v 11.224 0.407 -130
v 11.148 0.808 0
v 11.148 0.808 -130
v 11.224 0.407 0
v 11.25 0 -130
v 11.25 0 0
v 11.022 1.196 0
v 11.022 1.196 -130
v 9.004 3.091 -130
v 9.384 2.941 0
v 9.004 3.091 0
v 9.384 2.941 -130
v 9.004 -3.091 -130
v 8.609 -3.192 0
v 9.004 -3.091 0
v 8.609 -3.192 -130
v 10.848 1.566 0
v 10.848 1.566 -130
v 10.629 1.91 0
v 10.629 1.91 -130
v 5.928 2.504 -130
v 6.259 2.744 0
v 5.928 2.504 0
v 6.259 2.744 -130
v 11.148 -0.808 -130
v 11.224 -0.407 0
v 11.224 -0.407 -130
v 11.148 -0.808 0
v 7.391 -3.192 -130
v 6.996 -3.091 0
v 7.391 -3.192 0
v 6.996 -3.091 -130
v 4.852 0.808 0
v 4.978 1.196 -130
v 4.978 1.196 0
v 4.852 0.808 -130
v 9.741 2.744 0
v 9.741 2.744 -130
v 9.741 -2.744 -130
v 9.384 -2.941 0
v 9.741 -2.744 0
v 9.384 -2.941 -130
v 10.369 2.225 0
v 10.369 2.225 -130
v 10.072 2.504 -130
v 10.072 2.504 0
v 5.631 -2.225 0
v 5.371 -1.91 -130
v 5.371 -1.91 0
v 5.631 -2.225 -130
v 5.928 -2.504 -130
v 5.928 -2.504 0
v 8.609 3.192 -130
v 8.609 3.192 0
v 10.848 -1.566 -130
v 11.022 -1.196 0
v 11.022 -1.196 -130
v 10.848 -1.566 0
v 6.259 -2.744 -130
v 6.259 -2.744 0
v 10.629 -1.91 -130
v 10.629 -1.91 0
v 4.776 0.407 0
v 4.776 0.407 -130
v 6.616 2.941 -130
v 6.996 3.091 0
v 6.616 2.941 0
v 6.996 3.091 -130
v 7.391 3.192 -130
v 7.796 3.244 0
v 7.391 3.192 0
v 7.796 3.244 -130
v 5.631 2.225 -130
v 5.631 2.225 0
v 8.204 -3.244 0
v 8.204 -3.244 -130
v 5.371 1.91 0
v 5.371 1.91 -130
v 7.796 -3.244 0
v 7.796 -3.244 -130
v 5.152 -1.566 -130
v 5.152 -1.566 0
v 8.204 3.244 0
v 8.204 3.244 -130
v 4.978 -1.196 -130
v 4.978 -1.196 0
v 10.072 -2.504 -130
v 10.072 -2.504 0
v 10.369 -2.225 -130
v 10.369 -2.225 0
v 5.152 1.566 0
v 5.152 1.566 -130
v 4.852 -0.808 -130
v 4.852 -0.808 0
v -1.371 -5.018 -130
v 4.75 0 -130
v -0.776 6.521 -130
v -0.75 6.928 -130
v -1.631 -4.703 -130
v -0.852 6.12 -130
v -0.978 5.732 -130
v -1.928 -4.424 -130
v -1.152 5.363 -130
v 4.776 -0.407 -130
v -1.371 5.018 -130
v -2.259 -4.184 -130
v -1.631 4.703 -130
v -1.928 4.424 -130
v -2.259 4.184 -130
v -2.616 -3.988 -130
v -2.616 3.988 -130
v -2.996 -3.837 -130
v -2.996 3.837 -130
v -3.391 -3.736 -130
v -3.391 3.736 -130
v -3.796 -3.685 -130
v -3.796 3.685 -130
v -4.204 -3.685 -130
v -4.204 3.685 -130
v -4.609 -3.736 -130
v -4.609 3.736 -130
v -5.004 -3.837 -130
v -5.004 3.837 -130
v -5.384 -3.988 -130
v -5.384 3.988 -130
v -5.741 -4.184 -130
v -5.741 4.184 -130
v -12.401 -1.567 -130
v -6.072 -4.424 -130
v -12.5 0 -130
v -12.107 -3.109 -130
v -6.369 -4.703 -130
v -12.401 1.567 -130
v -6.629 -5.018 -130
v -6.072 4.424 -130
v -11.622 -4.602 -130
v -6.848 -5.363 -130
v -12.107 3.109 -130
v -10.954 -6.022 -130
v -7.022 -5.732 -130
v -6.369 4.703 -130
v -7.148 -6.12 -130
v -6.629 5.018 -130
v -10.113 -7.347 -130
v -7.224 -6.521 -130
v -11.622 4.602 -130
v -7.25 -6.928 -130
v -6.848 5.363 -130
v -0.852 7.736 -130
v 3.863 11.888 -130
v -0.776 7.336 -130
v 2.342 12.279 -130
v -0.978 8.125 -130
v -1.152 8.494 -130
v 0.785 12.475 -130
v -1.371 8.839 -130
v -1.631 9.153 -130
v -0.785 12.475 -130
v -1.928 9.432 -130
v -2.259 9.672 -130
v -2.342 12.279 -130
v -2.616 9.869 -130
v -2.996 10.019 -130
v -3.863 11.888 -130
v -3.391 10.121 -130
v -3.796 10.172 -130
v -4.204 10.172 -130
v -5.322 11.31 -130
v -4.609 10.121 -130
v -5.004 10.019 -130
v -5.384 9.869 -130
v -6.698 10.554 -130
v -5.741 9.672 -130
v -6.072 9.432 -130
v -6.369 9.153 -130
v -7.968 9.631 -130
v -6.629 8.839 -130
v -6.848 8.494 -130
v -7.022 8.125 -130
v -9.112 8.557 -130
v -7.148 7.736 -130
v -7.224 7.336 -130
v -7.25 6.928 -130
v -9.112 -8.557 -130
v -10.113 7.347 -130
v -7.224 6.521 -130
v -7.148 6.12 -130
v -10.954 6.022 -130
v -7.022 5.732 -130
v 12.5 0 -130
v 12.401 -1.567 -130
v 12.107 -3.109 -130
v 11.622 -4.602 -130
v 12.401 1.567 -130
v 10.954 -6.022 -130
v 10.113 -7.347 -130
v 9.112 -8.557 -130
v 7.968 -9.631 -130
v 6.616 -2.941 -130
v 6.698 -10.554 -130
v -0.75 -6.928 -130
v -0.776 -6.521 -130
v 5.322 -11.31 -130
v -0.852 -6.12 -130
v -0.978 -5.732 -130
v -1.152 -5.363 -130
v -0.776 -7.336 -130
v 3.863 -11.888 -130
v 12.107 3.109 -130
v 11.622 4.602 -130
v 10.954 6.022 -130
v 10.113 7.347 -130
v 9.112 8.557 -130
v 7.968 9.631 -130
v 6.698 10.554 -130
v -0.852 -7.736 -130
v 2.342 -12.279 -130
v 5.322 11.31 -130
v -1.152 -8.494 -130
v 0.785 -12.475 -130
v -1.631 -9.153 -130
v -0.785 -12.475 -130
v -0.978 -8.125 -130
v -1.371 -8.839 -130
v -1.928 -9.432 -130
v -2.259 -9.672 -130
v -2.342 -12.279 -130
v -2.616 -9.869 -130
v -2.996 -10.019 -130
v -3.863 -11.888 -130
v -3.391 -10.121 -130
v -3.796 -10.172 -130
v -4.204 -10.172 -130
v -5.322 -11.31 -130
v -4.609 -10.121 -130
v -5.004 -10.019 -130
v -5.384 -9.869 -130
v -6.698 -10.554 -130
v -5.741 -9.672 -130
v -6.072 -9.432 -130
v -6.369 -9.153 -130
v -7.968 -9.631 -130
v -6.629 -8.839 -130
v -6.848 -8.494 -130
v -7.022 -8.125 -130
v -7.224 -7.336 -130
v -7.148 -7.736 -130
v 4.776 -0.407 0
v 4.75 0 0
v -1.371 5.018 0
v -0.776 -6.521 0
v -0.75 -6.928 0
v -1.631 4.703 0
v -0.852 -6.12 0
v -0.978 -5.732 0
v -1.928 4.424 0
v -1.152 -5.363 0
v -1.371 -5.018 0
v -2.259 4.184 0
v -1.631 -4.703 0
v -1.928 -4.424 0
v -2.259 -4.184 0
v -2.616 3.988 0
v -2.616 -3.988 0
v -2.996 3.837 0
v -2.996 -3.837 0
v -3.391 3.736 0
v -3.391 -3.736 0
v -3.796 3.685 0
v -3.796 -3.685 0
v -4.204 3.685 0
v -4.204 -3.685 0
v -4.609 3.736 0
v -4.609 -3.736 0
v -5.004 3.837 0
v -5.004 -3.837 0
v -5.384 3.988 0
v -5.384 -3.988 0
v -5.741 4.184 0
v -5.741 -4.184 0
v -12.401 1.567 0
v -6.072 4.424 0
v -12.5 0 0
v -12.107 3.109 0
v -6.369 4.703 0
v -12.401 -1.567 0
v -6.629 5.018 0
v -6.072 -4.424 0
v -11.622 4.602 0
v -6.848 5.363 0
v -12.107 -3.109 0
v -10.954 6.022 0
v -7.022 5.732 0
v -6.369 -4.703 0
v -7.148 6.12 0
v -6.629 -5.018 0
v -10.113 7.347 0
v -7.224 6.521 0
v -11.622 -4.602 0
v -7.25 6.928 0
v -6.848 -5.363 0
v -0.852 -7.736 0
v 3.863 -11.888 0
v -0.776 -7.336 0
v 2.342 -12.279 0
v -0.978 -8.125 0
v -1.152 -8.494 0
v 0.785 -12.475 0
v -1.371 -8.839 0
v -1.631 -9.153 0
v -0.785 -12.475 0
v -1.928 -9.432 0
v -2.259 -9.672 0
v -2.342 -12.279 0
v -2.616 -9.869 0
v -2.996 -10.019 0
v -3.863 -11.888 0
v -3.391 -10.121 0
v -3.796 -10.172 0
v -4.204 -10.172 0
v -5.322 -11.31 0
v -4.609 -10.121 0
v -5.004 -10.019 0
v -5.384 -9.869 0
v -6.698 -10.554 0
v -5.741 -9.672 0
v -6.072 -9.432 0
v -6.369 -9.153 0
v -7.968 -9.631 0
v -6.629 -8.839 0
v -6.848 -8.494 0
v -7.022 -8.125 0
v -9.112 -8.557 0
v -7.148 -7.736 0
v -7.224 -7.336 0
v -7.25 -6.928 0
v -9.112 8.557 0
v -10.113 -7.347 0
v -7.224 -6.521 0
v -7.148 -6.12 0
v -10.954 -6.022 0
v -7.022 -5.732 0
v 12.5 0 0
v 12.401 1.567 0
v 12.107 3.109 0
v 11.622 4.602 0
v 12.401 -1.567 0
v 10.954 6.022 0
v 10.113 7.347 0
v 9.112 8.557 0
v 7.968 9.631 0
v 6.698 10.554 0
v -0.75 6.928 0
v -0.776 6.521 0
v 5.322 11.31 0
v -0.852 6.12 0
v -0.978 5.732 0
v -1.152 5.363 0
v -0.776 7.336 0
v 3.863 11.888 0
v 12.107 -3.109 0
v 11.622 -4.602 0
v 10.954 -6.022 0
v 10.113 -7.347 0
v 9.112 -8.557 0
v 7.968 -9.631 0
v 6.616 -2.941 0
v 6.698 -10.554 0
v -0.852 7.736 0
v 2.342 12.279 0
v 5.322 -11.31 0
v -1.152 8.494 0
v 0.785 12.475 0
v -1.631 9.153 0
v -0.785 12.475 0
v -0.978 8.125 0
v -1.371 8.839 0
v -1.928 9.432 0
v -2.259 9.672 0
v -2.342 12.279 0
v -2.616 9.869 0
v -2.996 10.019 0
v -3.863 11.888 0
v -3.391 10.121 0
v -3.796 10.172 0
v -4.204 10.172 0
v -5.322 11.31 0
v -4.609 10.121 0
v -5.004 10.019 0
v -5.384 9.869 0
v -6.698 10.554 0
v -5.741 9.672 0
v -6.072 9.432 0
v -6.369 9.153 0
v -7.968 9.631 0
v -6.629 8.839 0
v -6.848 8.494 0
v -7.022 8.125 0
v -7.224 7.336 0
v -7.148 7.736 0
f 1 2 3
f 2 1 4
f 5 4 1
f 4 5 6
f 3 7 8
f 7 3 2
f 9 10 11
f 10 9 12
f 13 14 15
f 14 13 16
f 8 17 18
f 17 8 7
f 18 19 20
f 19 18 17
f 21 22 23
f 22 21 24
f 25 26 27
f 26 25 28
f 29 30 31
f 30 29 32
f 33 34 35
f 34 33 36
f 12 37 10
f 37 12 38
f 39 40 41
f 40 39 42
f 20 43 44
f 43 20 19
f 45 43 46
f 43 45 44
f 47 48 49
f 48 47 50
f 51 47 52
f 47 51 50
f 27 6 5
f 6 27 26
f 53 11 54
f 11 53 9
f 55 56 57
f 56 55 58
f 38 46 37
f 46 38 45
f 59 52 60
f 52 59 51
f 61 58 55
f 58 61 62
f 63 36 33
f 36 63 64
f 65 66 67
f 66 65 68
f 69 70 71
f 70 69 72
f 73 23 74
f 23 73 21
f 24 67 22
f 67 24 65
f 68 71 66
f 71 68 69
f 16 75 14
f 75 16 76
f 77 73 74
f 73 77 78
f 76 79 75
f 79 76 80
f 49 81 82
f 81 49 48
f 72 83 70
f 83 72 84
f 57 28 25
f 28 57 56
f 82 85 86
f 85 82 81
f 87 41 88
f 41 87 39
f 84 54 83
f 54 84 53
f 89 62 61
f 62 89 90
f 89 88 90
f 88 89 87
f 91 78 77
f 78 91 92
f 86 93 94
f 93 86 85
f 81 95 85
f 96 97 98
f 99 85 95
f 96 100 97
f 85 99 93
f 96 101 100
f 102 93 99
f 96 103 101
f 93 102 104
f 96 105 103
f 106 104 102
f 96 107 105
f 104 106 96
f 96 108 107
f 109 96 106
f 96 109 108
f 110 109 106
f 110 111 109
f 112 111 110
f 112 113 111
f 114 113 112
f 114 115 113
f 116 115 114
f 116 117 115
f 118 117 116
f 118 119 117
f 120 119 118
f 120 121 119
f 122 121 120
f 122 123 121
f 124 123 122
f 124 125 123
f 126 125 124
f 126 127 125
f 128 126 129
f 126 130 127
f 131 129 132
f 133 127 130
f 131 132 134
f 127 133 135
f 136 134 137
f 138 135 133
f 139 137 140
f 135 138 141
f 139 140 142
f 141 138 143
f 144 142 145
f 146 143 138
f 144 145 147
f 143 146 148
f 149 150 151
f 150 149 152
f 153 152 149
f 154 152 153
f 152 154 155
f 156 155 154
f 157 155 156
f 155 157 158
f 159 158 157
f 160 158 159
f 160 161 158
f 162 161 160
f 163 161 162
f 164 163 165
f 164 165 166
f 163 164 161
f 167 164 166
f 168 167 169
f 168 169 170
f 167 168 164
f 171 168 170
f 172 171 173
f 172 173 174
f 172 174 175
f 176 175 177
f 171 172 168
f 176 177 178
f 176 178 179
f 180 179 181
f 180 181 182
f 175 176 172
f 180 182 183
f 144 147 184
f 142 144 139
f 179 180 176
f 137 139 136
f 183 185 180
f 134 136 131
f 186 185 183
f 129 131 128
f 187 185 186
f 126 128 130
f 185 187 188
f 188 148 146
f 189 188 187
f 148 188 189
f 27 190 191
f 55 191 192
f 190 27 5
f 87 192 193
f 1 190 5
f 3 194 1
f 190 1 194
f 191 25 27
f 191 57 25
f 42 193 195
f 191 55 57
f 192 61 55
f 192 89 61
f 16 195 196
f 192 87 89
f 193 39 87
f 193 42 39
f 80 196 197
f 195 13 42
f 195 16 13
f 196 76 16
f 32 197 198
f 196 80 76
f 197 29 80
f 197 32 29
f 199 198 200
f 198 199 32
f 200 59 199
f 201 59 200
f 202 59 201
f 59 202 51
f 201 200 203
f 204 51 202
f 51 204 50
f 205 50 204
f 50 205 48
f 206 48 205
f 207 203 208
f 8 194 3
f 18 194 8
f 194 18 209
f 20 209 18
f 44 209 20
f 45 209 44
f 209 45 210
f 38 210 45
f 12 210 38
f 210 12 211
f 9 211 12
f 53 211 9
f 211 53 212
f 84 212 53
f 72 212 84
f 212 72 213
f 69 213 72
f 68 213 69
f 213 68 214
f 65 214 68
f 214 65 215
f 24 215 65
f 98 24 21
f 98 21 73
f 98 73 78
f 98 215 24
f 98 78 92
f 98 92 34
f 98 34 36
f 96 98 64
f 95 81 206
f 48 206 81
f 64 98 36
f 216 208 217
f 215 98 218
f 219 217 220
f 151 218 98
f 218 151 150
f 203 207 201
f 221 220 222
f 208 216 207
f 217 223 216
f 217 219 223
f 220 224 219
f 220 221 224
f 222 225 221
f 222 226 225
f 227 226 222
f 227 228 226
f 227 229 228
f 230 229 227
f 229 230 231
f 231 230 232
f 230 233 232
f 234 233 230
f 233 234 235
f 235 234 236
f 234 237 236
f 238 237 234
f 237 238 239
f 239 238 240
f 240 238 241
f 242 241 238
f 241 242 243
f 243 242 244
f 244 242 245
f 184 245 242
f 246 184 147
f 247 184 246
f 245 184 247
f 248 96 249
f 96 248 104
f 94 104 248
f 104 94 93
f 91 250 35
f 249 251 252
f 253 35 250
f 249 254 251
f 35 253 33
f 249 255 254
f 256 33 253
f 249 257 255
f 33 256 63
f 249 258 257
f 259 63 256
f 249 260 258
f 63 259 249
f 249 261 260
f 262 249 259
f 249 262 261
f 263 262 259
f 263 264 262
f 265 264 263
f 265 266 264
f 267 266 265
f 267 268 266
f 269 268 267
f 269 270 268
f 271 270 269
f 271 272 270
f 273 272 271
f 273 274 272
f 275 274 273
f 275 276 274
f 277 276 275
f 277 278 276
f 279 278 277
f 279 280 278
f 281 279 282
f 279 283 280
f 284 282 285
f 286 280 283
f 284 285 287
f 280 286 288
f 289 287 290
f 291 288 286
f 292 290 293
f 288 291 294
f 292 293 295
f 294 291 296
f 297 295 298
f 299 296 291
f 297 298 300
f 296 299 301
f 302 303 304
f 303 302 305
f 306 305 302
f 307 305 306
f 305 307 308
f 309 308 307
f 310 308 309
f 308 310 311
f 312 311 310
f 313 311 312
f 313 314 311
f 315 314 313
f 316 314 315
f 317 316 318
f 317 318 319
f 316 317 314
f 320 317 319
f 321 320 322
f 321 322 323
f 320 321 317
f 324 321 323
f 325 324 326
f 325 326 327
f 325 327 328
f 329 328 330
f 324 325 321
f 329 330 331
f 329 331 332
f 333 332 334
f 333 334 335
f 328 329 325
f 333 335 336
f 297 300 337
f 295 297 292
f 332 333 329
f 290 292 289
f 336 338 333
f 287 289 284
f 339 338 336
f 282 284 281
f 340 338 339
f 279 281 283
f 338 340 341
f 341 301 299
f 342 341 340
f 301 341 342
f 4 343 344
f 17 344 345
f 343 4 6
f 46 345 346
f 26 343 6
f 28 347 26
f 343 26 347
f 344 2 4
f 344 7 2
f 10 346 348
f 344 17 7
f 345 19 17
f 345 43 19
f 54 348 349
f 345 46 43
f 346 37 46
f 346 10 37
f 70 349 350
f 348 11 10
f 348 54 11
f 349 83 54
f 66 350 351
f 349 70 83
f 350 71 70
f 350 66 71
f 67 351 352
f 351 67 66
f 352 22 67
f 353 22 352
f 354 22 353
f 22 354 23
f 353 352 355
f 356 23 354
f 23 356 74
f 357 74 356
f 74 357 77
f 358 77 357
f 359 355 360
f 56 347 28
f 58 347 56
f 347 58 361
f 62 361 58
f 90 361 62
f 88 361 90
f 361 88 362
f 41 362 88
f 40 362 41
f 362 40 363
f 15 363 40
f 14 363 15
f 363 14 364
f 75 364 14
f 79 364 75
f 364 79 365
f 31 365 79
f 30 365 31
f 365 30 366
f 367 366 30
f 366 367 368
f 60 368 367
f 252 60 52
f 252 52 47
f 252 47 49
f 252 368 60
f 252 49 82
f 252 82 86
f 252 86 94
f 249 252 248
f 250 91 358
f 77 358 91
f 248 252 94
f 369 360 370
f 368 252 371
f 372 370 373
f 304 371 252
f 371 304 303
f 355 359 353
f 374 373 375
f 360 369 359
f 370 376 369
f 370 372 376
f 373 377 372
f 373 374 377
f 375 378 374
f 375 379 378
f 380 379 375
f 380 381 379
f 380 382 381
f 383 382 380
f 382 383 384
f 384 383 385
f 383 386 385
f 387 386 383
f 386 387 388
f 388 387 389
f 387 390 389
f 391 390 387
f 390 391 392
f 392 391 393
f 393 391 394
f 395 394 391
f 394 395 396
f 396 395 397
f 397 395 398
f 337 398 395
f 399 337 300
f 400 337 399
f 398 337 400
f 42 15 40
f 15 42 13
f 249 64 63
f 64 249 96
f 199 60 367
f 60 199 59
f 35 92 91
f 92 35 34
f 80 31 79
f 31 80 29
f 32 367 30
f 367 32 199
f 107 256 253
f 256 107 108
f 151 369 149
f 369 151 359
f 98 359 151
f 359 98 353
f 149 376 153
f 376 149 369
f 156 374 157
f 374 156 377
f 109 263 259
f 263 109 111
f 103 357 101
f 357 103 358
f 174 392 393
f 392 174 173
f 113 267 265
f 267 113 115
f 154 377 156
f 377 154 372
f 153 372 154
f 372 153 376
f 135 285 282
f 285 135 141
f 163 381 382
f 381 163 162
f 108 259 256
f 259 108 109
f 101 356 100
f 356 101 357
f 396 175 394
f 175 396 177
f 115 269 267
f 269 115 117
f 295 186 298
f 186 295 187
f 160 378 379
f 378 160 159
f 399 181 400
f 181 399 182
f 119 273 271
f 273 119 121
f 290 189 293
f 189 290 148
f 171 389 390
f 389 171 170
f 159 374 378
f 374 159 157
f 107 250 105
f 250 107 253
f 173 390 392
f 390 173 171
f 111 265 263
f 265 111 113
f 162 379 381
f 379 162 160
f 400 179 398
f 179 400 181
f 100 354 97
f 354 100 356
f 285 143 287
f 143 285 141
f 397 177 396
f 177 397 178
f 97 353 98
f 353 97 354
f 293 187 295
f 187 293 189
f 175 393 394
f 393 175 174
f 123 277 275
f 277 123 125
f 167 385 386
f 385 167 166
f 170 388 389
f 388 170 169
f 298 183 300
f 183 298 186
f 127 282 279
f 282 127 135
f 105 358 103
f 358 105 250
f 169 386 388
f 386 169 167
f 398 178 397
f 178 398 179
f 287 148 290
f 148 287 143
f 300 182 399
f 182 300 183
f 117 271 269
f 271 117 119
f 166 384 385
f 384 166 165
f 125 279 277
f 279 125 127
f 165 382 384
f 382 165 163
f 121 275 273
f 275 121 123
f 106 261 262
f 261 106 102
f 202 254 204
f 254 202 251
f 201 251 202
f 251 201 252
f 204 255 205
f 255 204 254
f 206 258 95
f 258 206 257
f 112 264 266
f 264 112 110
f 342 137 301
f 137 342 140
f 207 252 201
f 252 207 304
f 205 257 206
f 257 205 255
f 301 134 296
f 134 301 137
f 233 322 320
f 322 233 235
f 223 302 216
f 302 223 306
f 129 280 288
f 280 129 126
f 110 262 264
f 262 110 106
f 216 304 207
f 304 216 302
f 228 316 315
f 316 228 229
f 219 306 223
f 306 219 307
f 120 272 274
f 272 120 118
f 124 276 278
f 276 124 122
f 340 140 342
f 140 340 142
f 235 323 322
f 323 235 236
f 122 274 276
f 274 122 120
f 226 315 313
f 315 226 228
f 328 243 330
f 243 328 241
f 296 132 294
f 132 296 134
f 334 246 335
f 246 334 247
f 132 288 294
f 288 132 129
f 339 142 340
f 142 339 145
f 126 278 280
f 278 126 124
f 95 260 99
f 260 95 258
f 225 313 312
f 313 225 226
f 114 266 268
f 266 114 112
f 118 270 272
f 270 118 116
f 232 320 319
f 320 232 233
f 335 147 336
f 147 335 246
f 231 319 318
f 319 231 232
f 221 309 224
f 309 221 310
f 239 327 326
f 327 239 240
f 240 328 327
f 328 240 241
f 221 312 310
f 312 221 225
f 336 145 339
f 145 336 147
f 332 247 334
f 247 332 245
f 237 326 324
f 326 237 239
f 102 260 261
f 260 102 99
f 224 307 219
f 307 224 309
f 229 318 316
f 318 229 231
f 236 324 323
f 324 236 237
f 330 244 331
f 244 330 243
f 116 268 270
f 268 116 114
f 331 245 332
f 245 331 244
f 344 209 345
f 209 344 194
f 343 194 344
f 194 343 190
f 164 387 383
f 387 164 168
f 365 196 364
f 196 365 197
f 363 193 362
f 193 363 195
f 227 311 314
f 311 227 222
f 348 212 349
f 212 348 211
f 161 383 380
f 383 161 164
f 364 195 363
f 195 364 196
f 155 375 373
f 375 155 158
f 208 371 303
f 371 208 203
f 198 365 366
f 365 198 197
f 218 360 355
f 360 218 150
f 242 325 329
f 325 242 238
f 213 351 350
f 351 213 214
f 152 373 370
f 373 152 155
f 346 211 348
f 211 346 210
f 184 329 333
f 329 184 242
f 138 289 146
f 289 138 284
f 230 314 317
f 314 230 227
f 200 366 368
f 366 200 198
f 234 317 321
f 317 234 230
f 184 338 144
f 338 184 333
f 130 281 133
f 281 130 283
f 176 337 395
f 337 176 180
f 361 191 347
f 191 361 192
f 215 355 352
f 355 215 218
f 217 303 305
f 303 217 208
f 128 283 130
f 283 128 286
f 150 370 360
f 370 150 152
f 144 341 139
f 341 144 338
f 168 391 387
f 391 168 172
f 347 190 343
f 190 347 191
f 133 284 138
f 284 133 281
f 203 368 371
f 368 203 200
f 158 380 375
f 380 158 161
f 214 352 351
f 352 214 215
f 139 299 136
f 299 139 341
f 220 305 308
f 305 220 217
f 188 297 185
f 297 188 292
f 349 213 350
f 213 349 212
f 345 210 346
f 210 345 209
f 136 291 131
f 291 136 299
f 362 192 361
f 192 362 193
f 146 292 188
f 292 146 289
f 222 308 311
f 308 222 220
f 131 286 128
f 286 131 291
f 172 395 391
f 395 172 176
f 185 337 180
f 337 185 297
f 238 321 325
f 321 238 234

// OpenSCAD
$fn = 50;


difference() {
	union() {
		translate(v = [0, 0, -130.0000000000]) {
			cylinder(h = 130, r = 12.5000000000);
		}
	}
	union() {
		#translate(v = [8.0000000000, 0.0000000000, -130]) {
			cylinder(h = 130, r = 3.2500000000);
		}
		#translate(v = [-4.0000000000, 6.9282032303, -130]) {
			cylinder(h = 130, r = 3.2500000000);
		}
		#translate(v = [-4.0000000000, -6.9282032303, -130]) {
			cylinder(h = 130, r = 3.2500000000);
		}
	}
}
